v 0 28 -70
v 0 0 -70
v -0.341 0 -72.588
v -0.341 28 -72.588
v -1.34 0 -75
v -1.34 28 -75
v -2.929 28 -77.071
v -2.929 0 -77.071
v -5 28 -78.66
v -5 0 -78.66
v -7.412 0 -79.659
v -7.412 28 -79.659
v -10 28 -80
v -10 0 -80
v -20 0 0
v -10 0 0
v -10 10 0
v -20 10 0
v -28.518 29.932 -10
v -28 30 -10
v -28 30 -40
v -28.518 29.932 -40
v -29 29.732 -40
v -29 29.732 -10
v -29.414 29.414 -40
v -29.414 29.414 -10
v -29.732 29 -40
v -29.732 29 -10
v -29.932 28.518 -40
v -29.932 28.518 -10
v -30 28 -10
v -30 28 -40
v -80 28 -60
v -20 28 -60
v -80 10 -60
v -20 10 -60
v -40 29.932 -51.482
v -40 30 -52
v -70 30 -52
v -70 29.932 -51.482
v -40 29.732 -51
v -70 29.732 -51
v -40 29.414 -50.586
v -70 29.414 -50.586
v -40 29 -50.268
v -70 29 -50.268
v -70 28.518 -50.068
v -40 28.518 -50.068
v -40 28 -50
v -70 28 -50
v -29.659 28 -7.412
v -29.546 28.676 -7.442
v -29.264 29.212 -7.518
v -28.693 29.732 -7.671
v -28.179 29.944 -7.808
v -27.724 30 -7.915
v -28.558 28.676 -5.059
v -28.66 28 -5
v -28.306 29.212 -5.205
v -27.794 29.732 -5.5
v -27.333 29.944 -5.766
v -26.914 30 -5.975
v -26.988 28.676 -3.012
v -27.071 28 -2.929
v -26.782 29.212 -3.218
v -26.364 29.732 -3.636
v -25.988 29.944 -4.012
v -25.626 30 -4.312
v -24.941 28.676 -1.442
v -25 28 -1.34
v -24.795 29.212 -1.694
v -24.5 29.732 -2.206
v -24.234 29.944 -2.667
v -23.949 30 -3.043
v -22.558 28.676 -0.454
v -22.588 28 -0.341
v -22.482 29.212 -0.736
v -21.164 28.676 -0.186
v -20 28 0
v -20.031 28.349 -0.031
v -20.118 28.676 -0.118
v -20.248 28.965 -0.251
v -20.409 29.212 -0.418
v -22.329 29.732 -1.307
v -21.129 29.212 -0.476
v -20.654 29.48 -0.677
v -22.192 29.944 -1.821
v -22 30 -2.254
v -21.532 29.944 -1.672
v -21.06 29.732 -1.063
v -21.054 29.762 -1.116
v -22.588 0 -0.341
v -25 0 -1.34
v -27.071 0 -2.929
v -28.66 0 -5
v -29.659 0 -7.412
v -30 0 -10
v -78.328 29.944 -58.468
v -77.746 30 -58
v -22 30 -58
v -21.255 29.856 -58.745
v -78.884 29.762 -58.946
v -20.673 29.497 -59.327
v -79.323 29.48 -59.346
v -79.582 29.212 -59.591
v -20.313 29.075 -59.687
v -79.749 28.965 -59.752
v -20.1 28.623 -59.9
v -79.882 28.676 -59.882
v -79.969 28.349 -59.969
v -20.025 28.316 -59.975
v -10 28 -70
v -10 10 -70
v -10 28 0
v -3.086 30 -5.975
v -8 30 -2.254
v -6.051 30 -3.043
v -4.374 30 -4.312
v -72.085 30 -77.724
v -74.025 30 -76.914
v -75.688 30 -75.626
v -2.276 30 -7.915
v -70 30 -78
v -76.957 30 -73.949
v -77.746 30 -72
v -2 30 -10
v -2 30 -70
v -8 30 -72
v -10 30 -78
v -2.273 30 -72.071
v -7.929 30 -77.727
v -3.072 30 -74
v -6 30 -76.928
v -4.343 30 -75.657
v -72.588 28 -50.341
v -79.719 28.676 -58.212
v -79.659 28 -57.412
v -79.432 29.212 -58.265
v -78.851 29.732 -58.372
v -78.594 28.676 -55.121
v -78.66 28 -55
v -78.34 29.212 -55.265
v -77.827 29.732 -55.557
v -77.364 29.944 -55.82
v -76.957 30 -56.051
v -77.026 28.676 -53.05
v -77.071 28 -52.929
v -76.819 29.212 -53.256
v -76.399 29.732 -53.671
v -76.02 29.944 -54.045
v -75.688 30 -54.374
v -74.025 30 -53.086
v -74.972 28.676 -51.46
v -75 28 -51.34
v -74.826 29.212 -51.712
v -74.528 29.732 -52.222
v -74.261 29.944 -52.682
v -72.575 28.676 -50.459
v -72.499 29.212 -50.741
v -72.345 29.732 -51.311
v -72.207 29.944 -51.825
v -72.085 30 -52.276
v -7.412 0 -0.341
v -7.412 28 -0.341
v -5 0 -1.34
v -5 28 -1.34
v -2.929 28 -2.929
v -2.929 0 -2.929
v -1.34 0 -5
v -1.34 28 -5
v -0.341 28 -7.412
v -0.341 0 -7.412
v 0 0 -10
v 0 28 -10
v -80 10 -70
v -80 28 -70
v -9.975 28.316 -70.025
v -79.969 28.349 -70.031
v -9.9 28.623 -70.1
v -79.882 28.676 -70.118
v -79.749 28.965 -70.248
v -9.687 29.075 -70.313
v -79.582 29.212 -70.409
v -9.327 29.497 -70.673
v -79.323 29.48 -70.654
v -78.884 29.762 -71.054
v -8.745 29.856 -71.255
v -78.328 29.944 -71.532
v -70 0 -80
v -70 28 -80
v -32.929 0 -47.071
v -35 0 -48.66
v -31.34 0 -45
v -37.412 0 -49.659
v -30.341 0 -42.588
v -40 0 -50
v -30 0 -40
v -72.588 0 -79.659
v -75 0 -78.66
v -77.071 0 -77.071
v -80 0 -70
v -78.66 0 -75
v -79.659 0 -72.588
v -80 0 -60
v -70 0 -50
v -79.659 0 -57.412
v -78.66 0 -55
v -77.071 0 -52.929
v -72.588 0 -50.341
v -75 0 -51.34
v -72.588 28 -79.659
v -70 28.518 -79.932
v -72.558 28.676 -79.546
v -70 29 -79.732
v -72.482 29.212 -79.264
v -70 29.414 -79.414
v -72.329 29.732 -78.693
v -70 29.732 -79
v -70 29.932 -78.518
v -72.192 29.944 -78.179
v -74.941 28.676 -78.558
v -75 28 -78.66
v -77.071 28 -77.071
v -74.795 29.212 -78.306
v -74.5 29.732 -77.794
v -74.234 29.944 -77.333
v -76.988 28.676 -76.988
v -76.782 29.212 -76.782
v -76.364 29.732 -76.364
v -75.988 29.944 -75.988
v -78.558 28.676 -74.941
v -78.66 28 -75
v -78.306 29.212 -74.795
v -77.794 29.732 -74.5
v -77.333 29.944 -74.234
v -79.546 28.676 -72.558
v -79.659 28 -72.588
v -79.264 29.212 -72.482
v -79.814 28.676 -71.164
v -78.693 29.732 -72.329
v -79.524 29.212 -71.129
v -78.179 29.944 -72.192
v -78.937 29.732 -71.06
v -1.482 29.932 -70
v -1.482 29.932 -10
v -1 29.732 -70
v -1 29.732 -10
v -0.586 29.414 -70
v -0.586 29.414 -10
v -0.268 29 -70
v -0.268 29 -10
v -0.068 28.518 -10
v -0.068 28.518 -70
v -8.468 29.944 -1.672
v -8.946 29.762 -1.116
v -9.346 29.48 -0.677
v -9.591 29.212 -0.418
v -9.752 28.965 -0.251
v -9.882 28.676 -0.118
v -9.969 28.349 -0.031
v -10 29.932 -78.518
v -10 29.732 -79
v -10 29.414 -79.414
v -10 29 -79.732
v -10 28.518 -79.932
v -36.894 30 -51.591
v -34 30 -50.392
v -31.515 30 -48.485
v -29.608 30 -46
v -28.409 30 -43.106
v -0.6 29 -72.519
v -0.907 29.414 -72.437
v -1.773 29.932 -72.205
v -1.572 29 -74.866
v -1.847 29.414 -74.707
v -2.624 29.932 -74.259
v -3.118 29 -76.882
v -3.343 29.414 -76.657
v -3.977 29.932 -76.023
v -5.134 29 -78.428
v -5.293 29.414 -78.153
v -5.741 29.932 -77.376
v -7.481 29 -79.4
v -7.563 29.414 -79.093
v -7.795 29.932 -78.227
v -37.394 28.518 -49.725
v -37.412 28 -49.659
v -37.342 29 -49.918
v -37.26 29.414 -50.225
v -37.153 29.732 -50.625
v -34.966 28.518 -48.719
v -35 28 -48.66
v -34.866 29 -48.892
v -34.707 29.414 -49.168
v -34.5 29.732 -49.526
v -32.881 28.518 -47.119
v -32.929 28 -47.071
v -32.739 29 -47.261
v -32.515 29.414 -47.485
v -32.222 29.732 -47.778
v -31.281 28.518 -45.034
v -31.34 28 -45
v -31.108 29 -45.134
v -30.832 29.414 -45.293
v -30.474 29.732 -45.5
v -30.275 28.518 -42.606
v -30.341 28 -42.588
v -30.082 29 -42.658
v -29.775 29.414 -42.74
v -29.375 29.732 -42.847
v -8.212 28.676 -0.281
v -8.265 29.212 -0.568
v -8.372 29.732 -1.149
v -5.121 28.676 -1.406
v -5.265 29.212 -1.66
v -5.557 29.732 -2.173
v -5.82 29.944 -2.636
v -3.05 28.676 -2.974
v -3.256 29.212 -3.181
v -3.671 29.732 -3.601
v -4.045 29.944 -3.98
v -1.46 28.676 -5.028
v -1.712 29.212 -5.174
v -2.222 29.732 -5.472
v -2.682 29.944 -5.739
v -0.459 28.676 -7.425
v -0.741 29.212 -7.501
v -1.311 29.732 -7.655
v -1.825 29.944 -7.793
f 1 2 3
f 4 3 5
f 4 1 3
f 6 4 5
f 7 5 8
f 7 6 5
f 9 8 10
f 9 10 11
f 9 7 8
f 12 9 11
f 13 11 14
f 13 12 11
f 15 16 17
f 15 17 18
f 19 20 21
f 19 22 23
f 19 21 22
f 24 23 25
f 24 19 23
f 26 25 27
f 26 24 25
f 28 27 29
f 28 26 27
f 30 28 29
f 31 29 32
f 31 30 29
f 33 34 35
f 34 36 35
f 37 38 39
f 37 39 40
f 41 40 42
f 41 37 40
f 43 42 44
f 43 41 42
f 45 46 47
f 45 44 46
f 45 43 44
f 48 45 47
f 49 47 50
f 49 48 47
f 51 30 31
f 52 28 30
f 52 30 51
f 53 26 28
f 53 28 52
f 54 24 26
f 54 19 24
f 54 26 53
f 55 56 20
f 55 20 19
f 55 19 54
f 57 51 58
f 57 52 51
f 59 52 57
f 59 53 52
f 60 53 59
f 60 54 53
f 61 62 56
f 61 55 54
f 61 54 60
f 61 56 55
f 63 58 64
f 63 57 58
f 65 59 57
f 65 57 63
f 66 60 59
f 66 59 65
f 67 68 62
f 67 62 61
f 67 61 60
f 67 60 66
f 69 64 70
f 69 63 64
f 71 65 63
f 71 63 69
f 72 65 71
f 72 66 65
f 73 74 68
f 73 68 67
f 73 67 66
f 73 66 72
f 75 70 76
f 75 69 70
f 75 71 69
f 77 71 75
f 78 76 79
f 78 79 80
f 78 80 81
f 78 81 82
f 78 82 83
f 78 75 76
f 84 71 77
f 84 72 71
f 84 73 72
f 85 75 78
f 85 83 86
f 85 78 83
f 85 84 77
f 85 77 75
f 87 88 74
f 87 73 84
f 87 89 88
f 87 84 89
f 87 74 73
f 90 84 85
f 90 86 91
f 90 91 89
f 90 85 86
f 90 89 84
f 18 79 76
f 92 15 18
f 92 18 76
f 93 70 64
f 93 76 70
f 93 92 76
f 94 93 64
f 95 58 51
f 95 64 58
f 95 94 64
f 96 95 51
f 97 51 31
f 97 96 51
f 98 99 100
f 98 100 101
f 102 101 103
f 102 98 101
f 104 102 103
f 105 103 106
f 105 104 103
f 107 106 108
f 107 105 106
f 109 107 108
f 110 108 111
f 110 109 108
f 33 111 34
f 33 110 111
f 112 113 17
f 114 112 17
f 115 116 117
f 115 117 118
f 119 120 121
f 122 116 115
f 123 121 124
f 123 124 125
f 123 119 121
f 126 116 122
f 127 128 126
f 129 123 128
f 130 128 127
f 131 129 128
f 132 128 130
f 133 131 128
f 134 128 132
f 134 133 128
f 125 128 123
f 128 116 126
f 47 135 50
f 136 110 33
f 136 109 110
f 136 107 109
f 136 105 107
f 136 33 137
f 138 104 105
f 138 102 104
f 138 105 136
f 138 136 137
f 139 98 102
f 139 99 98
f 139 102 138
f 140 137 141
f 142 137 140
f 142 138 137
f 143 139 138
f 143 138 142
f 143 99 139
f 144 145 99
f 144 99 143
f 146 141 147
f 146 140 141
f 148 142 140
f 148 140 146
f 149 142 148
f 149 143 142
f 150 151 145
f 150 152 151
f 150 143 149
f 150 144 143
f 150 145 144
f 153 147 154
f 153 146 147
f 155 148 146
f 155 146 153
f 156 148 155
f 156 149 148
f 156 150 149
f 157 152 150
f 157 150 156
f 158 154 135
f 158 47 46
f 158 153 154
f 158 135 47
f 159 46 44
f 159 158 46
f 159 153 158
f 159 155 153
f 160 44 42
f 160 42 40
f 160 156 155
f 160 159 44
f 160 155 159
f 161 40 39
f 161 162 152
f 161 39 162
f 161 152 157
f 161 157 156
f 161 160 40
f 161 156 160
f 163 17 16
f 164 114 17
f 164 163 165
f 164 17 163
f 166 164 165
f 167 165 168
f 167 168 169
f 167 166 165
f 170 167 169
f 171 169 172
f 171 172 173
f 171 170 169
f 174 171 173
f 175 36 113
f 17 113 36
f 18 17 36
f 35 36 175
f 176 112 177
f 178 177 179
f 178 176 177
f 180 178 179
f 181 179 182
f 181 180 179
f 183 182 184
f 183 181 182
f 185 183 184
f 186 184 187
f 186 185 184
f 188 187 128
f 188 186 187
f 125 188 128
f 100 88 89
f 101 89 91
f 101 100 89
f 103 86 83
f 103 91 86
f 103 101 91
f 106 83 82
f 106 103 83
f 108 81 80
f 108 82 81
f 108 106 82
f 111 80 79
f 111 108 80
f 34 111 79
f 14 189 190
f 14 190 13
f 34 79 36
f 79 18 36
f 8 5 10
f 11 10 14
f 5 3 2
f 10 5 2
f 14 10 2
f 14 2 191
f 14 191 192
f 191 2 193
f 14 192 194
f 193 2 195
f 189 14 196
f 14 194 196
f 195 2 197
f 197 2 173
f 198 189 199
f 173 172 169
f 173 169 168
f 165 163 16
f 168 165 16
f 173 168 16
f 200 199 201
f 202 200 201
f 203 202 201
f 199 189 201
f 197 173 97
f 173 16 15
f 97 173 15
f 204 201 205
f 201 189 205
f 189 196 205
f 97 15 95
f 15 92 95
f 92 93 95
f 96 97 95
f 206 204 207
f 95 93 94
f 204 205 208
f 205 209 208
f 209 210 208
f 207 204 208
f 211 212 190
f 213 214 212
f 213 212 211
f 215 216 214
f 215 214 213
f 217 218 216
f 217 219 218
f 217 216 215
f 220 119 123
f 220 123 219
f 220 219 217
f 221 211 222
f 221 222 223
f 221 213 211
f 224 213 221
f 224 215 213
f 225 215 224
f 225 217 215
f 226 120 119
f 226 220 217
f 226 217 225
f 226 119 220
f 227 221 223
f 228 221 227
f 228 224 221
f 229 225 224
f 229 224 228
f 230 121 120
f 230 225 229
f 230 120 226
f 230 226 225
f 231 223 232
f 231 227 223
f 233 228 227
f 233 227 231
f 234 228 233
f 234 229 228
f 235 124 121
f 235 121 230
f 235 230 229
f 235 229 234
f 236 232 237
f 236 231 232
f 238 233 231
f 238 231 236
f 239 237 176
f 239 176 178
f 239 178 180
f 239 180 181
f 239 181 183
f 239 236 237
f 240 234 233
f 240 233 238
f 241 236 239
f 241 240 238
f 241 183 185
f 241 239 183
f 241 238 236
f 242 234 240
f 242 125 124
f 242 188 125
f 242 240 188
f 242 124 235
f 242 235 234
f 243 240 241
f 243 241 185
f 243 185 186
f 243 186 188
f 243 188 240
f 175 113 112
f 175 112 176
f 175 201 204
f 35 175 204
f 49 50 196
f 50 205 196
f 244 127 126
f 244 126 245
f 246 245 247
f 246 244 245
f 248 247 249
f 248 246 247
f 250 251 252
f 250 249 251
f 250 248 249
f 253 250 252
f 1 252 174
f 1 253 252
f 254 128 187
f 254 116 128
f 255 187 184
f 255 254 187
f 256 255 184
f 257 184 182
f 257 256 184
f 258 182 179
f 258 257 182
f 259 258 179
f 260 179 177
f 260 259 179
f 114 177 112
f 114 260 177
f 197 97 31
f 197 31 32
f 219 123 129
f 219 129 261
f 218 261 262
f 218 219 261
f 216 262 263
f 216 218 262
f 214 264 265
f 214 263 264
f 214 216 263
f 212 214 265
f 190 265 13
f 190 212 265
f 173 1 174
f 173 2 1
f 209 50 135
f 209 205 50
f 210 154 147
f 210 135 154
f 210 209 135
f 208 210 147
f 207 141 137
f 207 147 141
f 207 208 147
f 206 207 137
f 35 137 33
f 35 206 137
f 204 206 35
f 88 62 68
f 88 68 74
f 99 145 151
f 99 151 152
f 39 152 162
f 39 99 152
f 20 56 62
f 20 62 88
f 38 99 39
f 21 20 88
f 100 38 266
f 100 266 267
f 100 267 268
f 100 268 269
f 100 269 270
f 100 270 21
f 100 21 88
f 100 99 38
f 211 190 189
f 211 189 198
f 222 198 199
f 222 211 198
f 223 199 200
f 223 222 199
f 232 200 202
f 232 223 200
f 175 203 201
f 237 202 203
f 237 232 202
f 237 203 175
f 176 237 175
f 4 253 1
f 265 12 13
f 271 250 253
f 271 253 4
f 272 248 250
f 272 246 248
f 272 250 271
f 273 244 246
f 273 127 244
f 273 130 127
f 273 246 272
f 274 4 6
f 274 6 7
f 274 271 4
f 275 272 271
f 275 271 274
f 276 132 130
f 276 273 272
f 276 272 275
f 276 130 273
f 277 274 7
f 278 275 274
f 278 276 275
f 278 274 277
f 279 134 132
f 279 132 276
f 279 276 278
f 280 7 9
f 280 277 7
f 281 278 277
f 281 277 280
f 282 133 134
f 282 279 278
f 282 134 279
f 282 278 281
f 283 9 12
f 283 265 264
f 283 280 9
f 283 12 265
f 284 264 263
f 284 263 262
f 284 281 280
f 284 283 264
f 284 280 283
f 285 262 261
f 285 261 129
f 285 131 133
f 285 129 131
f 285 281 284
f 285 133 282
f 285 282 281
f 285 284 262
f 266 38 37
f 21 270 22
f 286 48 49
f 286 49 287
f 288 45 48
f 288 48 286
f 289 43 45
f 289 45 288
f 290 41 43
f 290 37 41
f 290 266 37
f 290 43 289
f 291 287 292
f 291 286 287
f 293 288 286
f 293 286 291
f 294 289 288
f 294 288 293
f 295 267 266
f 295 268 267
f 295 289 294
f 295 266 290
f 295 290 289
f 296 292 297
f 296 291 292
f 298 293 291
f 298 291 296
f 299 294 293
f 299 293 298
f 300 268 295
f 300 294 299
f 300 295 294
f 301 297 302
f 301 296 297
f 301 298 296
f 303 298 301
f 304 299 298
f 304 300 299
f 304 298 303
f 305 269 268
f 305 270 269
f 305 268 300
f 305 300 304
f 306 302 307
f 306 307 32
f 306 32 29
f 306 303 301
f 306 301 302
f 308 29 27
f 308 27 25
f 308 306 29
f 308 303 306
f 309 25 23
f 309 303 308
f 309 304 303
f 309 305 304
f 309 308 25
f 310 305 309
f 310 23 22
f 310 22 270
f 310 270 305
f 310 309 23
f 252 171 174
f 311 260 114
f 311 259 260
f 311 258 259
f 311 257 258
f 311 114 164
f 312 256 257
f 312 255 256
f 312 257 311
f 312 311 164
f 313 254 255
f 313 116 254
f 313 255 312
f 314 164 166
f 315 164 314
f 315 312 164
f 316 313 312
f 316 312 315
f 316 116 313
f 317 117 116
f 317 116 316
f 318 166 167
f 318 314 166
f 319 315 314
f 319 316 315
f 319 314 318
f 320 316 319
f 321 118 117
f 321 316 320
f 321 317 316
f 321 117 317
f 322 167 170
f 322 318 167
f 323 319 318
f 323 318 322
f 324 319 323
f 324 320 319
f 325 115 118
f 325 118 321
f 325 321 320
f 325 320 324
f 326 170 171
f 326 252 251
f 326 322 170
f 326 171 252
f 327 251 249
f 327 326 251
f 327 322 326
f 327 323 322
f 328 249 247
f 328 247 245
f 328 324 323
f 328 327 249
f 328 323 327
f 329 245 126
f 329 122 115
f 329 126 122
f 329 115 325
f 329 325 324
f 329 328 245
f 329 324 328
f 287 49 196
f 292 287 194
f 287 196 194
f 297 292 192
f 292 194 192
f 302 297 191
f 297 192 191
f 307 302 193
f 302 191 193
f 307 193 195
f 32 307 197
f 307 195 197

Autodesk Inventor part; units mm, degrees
ref_plane "YZ Plane" through (0, 0, 0) normal (1, 0, 0) x (0, 1, 0)
ref_plane "XZ Plane" through (0, 0, 0) normal (0, 1, 0) x (-1, 0, 0)
ref_plane "XY Plane" through (0, 0, 0) normal (0, 0, 1) x (1, 0, 0)
sketch "Sketch1" plane through (0, 0, 0) normal (0, 1, 0) x (-1, 0, 0)
  line L0 (0, 0) -> (30, 0)
  line L1 (30, 0) -> (30, -80)
  line L2 (30, -80) -> (0, -80)
  line L3 (0, -80) -> (0, 0)
  line L4 (30, -80) -> (80, -80)
  line L5 (80, -80) -> (80, -50)
  line L6 (80, -50) -> (30, -50)
  line L7 (30, -50) -> (30, -80)
  dimension "d0" = 30
  dimension "d1" = 80
  dimension "d2" = 50
  dimension "d3" = 30
extrude "Extrusion1" add sketch "Sketch1" along normal blind 10
sketch "Sketch2" plane through (0, 10, 0) normal (0, 1, 0) x (1, 0, 0)
  line L0 (-30, 0) -> (0, 0) projected
  line L1 (-30, 0) -> (-20, 0)
  line L2 (-20, 0) -> (-20, 50)
  line L3 (-20, 50) -> (-30, 50)
  line L4 (-30, 50) -> (-30, 0)
  line L5 (-80, 80) -> (-80, 50) projected
  line L6 (-80, 50) -> (-20, 50)
  line L7 (-20, 50) -> (-20, 60)
  line L8 (-20, 60) -> (-80, 60)
  line L9 (-80, 60) -> (-80, 50)
  line L10 (-80, 80) -> (0, 80)
  line L11 (0, 80) -> (0, 70)
  line L12 (0, 70) -> (-80, 70)
  line L13 (-80, 70) -> (-80, 80)
  line L14 (0, 70) -> (-10, 70)
  line L15 (-10, 70) -> (-10, 0)
  line L16 (-10, 0) -> (0, 0)
  line L17 (0, 0) -> (0, 70)
  dimension "d6" = 10
  dimension "d7" = 10
  dimension "d8" = 80
  dimension "d9" = 10
  dimension "d10" = 10
extrude "Extrusion2" add sketch "Sketch2" along normal blind 20 contours L4 L3 L2 L0 | L6 L5 L8 L7 L3 | L15 L12 L17 L0 | L12 L5 L10 L11
fillet "Fillet1" radius 10 6 edges at (-30, 15, -50) (-30, 15, 0) (-80, 15, -50) (-80, 15, -80) (0, 15, -80) (0, 15, 0)
fillet "Fillet2" radius 2 12 edges at (-55, 30, -50) (-77.0711, 30, -52.9289) (-30, 30, -25) (-27.0711, 30, -2.9289) (-77.0711, 30, -77.0711) (-2.9289, 30, -77.0711) (-2.9289, 30, -2.9289) (-40, 30, -80) (-45, 30, -70) (-50, 30, -60) (-10, 30, -35) (-20, 30, -30)
properties part number "TSU_Corner_Top_Clamp"
